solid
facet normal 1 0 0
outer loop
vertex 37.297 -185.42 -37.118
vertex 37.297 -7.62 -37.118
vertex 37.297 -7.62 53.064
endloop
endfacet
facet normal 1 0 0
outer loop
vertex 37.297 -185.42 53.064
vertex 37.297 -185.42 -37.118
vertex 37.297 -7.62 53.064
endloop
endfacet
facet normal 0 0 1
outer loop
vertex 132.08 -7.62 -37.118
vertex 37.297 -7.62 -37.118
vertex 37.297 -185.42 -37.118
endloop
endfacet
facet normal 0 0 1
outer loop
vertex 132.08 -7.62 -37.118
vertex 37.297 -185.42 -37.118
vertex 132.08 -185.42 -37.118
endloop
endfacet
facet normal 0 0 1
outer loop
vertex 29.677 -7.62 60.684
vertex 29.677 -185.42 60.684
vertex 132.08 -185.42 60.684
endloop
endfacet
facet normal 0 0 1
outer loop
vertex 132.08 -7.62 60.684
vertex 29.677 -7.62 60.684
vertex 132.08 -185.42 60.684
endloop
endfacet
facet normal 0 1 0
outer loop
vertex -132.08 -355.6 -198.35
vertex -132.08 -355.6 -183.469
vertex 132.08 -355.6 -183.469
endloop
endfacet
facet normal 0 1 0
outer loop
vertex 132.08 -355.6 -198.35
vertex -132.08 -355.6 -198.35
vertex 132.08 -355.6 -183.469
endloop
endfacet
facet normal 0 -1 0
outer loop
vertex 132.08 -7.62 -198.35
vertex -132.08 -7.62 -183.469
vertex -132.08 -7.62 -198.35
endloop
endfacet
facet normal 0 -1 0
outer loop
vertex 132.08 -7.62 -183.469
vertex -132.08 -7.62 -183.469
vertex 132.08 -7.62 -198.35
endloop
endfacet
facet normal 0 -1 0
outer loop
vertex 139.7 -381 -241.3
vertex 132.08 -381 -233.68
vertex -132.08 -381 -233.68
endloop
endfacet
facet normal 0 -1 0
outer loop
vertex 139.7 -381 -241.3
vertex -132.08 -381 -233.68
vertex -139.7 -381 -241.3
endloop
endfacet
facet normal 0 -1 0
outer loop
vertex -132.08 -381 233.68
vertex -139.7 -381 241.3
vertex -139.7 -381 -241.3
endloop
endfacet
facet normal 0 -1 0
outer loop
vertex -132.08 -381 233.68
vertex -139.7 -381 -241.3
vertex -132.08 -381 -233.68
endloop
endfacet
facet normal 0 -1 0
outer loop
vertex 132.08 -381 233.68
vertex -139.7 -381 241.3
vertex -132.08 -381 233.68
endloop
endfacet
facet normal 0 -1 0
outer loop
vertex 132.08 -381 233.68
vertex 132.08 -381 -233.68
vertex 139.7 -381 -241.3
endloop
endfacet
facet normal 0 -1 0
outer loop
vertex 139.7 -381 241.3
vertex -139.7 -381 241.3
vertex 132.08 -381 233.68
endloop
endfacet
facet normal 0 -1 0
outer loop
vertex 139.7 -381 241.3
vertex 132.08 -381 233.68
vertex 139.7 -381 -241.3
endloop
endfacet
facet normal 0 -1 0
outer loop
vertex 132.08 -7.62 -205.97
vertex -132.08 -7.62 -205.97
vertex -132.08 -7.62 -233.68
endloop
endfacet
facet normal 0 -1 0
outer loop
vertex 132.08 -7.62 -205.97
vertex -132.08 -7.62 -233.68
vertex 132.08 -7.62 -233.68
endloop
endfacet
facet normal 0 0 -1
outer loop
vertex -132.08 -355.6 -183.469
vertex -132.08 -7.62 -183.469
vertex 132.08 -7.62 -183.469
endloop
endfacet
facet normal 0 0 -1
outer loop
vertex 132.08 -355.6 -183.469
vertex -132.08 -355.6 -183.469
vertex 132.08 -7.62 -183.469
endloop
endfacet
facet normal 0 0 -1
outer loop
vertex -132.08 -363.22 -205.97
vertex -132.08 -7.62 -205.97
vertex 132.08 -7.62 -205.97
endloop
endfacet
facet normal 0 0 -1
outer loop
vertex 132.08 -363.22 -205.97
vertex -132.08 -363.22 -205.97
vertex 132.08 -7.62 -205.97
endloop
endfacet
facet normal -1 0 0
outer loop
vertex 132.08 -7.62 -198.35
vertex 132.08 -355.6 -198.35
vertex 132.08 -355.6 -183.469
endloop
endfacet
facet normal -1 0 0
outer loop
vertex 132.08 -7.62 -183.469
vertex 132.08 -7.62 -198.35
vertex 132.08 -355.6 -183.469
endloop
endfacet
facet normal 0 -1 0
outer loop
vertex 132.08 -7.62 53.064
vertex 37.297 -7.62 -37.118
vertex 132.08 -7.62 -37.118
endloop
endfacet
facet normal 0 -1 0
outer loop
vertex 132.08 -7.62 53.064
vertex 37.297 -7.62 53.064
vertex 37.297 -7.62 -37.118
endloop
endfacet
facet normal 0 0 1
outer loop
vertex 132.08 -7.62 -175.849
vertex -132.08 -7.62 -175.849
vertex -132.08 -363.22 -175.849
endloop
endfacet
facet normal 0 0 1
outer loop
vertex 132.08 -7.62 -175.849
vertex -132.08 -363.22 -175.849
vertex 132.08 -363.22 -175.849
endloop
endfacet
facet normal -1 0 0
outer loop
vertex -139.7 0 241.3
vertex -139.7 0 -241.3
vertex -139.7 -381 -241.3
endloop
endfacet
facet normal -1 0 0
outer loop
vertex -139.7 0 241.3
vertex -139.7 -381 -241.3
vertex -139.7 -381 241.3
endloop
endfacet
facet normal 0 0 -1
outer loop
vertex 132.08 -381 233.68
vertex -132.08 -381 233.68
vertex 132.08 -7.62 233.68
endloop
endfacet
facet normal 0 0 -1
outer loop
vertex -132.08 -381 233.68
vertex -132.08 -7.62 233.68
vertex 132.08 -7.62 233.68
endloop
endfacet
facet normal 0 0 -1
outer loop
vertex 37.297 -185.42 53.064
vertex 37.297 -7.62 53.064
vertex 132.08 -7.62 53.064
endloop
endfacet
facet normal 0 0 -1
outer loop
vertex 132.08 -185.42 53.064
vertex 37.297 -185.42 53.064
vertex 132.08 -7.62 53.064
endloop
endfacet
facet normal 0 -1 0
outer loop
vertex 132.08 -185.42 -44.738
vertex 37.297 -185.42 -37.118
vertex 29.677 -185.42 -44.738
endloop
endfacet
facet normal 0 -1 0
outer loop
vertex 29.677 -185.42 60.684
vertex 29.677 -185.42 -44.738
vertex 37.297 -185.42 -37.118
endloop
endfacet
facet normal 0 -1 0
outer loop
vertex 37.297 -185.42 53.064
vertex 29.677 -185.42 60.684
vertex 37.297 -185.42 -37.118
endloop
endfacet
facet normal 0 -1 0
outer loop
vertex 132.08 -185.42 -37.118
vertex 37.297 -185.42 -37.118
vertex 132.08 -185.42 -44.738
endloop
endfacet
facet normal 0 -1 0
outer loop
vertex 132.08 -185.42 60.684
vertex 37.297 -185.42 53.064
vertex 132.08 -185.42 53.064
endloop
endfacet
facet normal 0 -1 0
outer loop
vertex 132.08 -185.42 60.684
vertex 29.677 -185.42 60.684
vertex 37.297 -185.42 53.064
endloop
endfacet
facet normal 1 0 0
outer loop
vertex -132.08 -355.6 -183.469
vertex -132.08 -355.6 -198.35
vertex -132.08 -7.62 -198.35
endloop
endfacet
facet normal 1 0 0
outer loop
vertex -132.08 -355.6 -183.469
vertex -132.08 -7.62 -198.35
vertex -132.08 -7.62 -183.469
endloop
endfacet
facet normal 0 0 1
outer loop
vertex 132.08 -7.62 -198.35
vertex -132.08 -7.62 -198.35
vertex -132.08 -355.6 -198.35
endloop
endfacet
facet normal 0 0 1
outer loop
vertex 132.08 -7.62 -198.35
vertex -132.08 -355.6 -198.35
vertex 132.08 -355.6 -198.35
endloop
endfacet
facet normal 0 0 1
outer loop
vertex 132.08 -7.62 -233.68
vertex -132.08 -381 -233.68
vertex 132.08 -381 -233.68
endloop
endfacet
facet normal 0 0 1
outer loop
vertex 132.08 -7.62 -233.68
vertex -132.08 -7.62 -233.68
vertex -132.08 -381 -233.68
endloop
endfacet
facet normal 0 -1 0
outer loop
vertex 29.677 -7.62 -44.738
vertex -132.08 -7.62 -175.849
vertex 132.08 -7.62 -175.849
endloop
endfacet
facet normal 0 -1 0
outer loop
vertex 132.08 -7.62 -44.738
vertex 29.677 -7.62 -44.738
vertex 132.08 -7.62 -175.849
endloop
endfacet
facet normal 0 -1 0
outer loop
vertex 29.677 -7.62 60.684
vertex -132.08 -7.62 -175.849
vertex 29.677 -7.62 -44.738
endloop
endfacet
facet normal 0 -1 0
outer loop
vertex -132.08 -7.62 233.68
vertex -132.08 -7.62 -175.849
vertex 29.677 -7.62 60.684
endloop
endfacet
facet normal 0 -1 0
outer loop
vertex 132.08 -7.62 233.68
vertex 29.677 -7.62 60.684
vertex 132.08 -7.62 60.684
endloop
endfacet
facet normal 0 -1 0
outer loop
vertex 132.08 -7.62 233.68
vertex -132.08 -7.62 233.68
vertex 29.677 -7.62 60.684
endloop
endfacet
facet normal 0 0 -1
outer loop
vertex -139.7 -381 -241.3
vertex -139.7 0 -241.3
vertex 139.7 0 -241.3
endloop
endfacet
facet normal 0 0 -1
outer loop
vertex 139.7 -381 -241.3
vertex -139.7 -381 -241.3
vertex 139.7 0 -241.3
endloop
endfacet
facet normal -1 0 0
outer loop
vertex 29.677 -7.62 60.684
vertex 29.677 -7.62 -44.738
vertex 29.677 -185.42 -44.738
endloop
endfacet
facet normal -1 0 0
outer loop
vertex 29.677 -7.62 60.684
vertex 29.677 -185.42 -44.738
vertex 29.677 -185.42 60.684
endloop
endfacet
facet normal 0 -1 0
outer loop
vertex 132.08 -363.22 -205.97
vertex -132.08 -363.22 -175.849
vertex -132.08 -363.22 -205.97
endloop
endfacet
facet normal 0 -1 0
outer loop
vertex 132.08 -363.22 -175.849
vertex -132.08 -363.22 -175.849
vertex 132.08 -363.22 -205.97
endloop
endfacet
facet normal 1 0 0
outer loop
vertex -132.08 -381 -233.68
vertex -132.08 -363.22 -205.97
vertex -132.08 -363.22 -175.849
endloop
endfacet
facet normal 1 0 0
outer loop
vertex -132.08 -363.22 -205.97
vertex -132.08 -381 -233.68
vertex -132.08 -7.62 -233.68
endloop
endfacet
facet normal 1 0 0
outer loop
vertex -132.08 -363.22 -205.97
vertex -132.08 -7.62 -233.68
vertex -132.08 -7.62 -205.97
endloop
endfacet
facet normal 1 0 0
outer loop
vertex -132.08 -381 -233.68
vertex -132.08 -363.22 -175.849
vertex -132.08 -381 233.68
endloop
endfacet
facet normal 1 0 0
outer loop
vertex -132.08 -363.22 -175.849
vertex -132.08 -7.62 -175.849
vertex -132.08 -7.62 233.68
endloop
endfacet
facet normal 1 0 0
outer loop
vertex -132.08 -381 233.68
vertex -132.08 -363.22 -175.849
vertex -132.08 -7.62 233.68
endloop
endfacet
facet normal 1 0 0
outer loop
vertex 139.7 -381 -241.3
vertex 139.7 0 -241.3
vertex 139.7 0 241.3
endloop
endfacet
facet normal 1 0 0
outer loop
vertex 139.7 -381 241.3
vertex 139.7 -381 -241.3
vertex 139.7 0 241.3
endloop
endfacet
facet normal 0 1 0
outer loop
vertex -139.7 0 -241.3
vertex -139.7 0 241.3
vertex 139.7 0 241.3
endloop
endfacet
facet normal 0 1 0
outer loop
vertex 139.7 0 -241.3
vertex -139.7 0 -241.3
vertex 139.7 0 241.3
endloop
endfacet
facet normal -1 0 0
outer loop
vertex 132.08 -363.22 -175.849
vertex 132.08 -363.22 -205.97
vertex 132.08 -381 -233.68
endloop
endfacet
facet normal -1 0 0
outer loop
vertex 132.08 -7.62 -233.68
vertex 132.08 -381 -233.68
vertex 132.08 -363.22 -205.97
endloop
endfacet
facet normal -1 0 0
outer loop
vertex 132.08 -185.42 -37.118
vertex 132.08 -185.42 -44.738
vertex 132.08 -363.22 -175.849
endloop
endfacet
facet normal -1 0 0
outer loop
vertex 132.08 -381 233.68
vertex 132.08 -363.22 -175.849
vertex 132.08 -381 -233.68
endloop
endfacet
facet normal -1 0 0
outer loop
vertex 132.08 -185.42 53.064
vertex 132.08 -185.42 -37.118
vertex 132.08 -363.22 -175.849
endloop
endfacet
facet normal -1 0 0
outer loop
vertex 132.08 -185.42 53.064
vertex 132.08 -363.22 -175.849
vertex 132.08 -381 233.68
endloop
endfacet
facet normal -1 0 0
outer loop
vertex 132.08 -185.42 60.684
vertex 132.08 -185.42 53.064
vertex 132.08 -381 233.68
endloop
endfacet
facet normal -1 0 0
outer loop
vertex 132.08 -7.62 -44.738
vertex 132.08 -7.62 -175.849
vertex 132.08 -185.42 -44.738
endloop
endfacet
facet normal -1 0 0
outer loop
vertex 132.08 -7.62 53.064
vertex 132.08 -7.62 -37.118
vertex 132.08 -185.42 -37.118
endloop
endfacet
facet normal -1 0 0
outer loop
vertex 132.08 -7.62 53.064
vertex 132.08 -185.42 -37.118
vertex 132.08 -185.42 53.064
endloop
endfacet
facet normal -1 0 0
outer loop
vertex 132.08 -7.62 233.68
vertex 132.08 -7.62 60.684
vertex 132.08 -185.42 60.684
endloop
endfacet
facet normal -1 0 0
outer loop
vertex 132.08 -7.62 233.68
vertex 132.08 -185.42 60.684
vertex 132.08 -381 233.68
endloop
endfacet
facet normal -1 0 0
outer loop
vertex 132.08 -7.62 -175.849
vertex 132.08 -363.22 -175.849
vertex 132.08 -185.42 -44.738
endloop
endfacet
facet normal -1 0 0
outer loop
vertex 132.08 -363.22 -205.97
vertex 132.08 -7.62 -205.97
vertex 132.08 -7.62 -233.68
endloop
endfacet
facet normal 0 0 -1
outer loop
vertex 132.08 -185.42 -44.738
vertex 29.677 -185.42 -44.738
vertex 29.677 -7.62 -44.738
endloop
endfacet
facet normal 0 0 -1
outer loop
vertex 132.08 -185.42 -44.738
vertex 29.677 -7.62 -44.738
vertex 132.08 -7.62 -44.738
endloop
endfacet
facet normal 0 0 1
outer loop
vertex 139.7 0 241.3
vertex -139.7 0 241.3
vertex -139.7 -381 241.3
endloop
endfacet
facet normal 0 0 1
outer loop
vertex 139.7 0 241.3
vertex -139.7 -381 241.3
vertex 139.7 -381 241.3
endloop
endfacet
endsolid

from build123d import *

# Parameters (mm, degrees)
F0_W         = 279.4
F0_H         = 482.6
F1_DEPTH     = 381
F2_T         = -7.62
F3_W         = 264.16
F3_H         = 30.1203280687
F4_DEPTH     = 355.6
F5_W         = 102.4026331621
F5_H         = 105.4210998118
F6_DEPTH     = 177.8
F7_DEPTH     = 177.8
F8_T         = 7.62
F8_T3_DEPTH  = 388.62
F8_T5_DEPTH  = 42.9501895142
F8_T7_DEPTH  = 370.84
F8_T9_DEPTH  = 45.3603280687
F8_T11_DEPTH = 146.3519571328
F8_T13_DEPTH = 193.04
F8_T15_DEPTH = 188.2364254725
F8_T17_DEPTH = 279.4
F8_T19_DEPTH = 424.7694824171
F8_T21_DEPTH = 117.6426331621
F8_T23_DEPTH = 120.6610998118


# Not quite as in the source:
# - a shell that OpenCascade refuses in one call is made with other operations: the cavity is built on its own and cut out


with BuildPart() as f1:
    # F0 (on Front) → F1 (new body)
    with BuildSketch(Plane.XZ):
        Rectangle(F0_W, F0_H)
    extrude(amount=F1_DEPTH)

    # F2
    f2_openings = [f1.faces().sort_by_distance(p)[0] for p in [
        (0, -381, 0),
    ]]
    offset(amount=F2_T, openings=f2_openings)

    # F3 (on face) → F4 (join)
    with BuildSketch(Plane.XZ.offset(7.62)):
        with Locations((0, -190.9096464515)):
            Rectangle(F3_W, F3_H)
    extrude(amount=F4_DEPTH)

    # F5 (on face) → F6 (join)
    with BuildSketch(Plane.XZ.offset(7.62)):
        with Locations((80.8786834189, 7.9730246216)):
            Rectangle(F5_W, F5_H)
    extrude(amount=F6_DEPTH)

    # F7 (add): a face of the model
    f7_faces = [f1.faces().sort_by_distance(p)[0] for p in [
        (80.8786834189, -185.42, 7.9730246216),
    ]]
    extrude(f7_faces, amount=-F7_DEPTH)

    # F8: shell of thickness 7.62, made by hand


with BuildPart() as f8_core1:
    # F8_t2: copy of F1
    add(f1.part)

    # the walls: a layer under each face that stays
    f8_faces = [f8_core1.faces().sort_by_distance(p)[0] for p in [
        (139.7, -190.5, 0),
        (0, -190.5, -241.3),
        (0, -190.5, 241.3),
        (0, 0, 0),
        (96.04375, -381, -235.3419753086),
        (-139.7, -190.5, 0),
        (132.08, -194.31, 0),
        (0, -194.31, -233.68),
        (-132.08, -194.31, 0),
        (0, -194.31, 233.68),
        (0, -7.62, -219.8249052429),
        (0, -185.42, -205.9698104858),
        (0, -363.22, -190.9096464515),
        (0, -185.42, -175.8494824171),
        (0, -7.62, 28.9152587914),
        (80.8786834189, -96.52, -44.7375252843),
        (80.8786834189, -96.52, 60.6835745275),
        (29.6773668379, -96.52, 7.9730246216),
    ]]
    thicken(f8_faces, amount=-F8_T, mode=Mode.SUBTRACT)

    # F8_s4 → F8_t3 (cut)
    with BuildSketch(Plane.XZ):
        Polygon((132.0038, -233.6038), (139.7, -233.68), (139.7, -241.3), (132.08, -241.3), align=None)
        Polygon((132.0038, 233.6038), (139.7, 233.68), (139.7, 241.3), (132.08, 241.3), align=None)
        Polygon((-132.0038, -233.6038), (-132.08, -241.3), (-139.7, -241.3), (-139.7, -233.68), align=None)
        Polygon((-132.0038, 233.6038), (-139.7, 233.68), (-139.7, 241.3), (-132.08, 241.3), align=None)
    extrude(amount=F8_T3_DEPTH, mode=Mode.SUBTRACT)

    # F8_s6 → F8_t5 (cut)
    with BuildSketch(Plane.XY.offset(-241.3)):
        Polygon((132.0038, -7.6962), (139.7, -7.62), (139.7, 0), (132.08, 0), align=None)
        Polygon((-132.0038, -7.6962), (-139.7, -7.62), (-139.7, 0), (-132.08, 0), align=None)
    extrude(amount=F8_T5_DEPTH, mode=Mode.SUBTRACT)

    # F8_s8 → F8_t7 (cut)
    with BuildSketch(Plane.XZ):
        Polygon((132.0038, -206.0460104858), (139.7, -205.9698104858), (139.7, -198.3498104858), (132.08, -198.3498104858), align=None)
        Polygon((132.0038, -175.7732824171), (139.7, -175.8494824171), (139.7, -183.4694824171), (132.08, -183.4694824171), align=None)
        Polygon((-132.0038, -175.7732824171), (-139.7, -175.8494824171), (-139.7, -183.4694824171), (-132.08, -183.4694824171), align=None)
        Polygon((-132.0038, -206.0460104858), (-139.7, -205.9698104858), (-139.7, -198.3498104858), (-132.08, -198.3498104858), align=None)
    extrude(amount=F8_T7_DEPTH, mode=Mode.SUBTRACT)

    # F8_s10 → F8_t9 (cut)
    with BuildSketch(Plane.XY.offset(-213.5898104858)):
        Polygon((132.0038, -363.2962), (139.7, -363.22), (139.7, -355.6), (132.08, -355.6), align=None)
        Polygon((-132.0038, -363.2962), (-139.7, -363.22), (-139.7, -355.6), (-132.08, -355.6), align=None)
    extrude(amount=F8_T9_DEPTH, mode=Mode.SUBTRACT)

    # F8_s12 → F8_t11 (cut)
    with BuildSketch(Plane.XY.offset(-183.4694824171)):
        Polygon((132.0038, -7.6962), (139.7, -7.62), (139.7, 0), (132.08, 0), align=None)
    extrude(amount=F8_T11_DEPTH, mode=Mode.SUBTRACT)

    # F8_s14 → F8_t13 (cut)
    with BuildSketch(Plane.XZ):
        Polygon((132.0038, -44.8137252843), (139.7, -44.7375252843), (139.7, -37.1175252843), (132.08, -37.1175252843), align=None)
        Polygon((132.0038, 60.7597745275), (139.7, 60.6835745275), (139.7, 53.0635745275), (132.08, 53.0635745275), align=None)
    extrude(amount=F8_T13_DEPTH, mode=Mode.SUBTRACT)

    # F8_s16 → F8_t15 (cut)
    with BuildSketch(Plane.XY.offset(53.0635745275)):
        Polygon((132.0038, -7.6962), (139.7, -7.62), (139.7, 0), (132.08, 0), align=None)
    extrude(amount=F8_T15_DEPTH, mode=Mode.SUBTRACT)

    # F8_s18 → F8_t17 (cut)
    with BuildSketch(Plane.YZ.offset(-139.7)):
        Polygon((-7.6962, -233.6038), (-7.62, -241.3), (0, -241.3), (0, -233.68), align=None)
        Polygon((-7.6962, 233.6038), (-7.62, 241.3), (0, 241.3), (0, 233.68), align=None)
        Polygon((-7.6962, -206.0460104858), (0, -205.9698104858), (0, -198.3498104858), (-7.62, -198.3498104858), align=None)
        Polygon((-7.6962, -175.7732824171), (-7.62, -183.4694824171), (0, -183.4694824171), (0, -175.8494824171), align=None)
    extrude(amount=F8_T17_DEPTH, mode=Mode.SUBTRACT)

    # F8_s20 → F8_t19 (cut)
    with BuildSketch(Plane.XY.offset(-183.4694824171)):
        Polygon((-132.0038, -7.6962), (-139.7, -7.62), (-139.7, 0), (-132.08, 0), align=None)
    extrude(amount=F8_T19_DEPTH, mode=Mode.SUBTRACT)

    # F8_s22 → F8_t21 (cut)
    with BuildSketch(Plane.YZ.offset(22.0573668379)):
        Polygon((-7.6962, 60.7597745275), (0, 60.6835745275), (0, 53.0635745275), (-7.62, 53.0635745275), align=None)
        Polygon((-7.6962, -44.8137252843), (0, -44.7375252843), (0, -37.1175252843), (-7.62, -37.1175252843), align=None)
    extrude(amount=F8_T21_DEPTH, mode=Mode.SUBTRACT)

    # F8_s24 → F8_t23 (cut)
    with BuildSketch(Plane.XY.offset(-52.3575252843)):
        Polygon((29.6011668379, -7.6962), (29.6773668379, 0), (37.2973668379, 0), (37.2973668379, -7.62), align=None)
    extrude(amount=F8_T23_DEPTH, mode=Mode.SUBTRACT)


with BuildPart() as f1_1:
    add(f1.part)

    # what is left inside the walls is the cavity
    f8_cavity = [f8_core1.part.solids().sort_by_distance(p)[0] for p in [
        (84.688683, -126.153333, 52.987375),
        (0, -239.606667, -183.545682),
    ]]
    add(f8_cavity, mode=Mode.SUBTRACT)


solid = f1_1.part
